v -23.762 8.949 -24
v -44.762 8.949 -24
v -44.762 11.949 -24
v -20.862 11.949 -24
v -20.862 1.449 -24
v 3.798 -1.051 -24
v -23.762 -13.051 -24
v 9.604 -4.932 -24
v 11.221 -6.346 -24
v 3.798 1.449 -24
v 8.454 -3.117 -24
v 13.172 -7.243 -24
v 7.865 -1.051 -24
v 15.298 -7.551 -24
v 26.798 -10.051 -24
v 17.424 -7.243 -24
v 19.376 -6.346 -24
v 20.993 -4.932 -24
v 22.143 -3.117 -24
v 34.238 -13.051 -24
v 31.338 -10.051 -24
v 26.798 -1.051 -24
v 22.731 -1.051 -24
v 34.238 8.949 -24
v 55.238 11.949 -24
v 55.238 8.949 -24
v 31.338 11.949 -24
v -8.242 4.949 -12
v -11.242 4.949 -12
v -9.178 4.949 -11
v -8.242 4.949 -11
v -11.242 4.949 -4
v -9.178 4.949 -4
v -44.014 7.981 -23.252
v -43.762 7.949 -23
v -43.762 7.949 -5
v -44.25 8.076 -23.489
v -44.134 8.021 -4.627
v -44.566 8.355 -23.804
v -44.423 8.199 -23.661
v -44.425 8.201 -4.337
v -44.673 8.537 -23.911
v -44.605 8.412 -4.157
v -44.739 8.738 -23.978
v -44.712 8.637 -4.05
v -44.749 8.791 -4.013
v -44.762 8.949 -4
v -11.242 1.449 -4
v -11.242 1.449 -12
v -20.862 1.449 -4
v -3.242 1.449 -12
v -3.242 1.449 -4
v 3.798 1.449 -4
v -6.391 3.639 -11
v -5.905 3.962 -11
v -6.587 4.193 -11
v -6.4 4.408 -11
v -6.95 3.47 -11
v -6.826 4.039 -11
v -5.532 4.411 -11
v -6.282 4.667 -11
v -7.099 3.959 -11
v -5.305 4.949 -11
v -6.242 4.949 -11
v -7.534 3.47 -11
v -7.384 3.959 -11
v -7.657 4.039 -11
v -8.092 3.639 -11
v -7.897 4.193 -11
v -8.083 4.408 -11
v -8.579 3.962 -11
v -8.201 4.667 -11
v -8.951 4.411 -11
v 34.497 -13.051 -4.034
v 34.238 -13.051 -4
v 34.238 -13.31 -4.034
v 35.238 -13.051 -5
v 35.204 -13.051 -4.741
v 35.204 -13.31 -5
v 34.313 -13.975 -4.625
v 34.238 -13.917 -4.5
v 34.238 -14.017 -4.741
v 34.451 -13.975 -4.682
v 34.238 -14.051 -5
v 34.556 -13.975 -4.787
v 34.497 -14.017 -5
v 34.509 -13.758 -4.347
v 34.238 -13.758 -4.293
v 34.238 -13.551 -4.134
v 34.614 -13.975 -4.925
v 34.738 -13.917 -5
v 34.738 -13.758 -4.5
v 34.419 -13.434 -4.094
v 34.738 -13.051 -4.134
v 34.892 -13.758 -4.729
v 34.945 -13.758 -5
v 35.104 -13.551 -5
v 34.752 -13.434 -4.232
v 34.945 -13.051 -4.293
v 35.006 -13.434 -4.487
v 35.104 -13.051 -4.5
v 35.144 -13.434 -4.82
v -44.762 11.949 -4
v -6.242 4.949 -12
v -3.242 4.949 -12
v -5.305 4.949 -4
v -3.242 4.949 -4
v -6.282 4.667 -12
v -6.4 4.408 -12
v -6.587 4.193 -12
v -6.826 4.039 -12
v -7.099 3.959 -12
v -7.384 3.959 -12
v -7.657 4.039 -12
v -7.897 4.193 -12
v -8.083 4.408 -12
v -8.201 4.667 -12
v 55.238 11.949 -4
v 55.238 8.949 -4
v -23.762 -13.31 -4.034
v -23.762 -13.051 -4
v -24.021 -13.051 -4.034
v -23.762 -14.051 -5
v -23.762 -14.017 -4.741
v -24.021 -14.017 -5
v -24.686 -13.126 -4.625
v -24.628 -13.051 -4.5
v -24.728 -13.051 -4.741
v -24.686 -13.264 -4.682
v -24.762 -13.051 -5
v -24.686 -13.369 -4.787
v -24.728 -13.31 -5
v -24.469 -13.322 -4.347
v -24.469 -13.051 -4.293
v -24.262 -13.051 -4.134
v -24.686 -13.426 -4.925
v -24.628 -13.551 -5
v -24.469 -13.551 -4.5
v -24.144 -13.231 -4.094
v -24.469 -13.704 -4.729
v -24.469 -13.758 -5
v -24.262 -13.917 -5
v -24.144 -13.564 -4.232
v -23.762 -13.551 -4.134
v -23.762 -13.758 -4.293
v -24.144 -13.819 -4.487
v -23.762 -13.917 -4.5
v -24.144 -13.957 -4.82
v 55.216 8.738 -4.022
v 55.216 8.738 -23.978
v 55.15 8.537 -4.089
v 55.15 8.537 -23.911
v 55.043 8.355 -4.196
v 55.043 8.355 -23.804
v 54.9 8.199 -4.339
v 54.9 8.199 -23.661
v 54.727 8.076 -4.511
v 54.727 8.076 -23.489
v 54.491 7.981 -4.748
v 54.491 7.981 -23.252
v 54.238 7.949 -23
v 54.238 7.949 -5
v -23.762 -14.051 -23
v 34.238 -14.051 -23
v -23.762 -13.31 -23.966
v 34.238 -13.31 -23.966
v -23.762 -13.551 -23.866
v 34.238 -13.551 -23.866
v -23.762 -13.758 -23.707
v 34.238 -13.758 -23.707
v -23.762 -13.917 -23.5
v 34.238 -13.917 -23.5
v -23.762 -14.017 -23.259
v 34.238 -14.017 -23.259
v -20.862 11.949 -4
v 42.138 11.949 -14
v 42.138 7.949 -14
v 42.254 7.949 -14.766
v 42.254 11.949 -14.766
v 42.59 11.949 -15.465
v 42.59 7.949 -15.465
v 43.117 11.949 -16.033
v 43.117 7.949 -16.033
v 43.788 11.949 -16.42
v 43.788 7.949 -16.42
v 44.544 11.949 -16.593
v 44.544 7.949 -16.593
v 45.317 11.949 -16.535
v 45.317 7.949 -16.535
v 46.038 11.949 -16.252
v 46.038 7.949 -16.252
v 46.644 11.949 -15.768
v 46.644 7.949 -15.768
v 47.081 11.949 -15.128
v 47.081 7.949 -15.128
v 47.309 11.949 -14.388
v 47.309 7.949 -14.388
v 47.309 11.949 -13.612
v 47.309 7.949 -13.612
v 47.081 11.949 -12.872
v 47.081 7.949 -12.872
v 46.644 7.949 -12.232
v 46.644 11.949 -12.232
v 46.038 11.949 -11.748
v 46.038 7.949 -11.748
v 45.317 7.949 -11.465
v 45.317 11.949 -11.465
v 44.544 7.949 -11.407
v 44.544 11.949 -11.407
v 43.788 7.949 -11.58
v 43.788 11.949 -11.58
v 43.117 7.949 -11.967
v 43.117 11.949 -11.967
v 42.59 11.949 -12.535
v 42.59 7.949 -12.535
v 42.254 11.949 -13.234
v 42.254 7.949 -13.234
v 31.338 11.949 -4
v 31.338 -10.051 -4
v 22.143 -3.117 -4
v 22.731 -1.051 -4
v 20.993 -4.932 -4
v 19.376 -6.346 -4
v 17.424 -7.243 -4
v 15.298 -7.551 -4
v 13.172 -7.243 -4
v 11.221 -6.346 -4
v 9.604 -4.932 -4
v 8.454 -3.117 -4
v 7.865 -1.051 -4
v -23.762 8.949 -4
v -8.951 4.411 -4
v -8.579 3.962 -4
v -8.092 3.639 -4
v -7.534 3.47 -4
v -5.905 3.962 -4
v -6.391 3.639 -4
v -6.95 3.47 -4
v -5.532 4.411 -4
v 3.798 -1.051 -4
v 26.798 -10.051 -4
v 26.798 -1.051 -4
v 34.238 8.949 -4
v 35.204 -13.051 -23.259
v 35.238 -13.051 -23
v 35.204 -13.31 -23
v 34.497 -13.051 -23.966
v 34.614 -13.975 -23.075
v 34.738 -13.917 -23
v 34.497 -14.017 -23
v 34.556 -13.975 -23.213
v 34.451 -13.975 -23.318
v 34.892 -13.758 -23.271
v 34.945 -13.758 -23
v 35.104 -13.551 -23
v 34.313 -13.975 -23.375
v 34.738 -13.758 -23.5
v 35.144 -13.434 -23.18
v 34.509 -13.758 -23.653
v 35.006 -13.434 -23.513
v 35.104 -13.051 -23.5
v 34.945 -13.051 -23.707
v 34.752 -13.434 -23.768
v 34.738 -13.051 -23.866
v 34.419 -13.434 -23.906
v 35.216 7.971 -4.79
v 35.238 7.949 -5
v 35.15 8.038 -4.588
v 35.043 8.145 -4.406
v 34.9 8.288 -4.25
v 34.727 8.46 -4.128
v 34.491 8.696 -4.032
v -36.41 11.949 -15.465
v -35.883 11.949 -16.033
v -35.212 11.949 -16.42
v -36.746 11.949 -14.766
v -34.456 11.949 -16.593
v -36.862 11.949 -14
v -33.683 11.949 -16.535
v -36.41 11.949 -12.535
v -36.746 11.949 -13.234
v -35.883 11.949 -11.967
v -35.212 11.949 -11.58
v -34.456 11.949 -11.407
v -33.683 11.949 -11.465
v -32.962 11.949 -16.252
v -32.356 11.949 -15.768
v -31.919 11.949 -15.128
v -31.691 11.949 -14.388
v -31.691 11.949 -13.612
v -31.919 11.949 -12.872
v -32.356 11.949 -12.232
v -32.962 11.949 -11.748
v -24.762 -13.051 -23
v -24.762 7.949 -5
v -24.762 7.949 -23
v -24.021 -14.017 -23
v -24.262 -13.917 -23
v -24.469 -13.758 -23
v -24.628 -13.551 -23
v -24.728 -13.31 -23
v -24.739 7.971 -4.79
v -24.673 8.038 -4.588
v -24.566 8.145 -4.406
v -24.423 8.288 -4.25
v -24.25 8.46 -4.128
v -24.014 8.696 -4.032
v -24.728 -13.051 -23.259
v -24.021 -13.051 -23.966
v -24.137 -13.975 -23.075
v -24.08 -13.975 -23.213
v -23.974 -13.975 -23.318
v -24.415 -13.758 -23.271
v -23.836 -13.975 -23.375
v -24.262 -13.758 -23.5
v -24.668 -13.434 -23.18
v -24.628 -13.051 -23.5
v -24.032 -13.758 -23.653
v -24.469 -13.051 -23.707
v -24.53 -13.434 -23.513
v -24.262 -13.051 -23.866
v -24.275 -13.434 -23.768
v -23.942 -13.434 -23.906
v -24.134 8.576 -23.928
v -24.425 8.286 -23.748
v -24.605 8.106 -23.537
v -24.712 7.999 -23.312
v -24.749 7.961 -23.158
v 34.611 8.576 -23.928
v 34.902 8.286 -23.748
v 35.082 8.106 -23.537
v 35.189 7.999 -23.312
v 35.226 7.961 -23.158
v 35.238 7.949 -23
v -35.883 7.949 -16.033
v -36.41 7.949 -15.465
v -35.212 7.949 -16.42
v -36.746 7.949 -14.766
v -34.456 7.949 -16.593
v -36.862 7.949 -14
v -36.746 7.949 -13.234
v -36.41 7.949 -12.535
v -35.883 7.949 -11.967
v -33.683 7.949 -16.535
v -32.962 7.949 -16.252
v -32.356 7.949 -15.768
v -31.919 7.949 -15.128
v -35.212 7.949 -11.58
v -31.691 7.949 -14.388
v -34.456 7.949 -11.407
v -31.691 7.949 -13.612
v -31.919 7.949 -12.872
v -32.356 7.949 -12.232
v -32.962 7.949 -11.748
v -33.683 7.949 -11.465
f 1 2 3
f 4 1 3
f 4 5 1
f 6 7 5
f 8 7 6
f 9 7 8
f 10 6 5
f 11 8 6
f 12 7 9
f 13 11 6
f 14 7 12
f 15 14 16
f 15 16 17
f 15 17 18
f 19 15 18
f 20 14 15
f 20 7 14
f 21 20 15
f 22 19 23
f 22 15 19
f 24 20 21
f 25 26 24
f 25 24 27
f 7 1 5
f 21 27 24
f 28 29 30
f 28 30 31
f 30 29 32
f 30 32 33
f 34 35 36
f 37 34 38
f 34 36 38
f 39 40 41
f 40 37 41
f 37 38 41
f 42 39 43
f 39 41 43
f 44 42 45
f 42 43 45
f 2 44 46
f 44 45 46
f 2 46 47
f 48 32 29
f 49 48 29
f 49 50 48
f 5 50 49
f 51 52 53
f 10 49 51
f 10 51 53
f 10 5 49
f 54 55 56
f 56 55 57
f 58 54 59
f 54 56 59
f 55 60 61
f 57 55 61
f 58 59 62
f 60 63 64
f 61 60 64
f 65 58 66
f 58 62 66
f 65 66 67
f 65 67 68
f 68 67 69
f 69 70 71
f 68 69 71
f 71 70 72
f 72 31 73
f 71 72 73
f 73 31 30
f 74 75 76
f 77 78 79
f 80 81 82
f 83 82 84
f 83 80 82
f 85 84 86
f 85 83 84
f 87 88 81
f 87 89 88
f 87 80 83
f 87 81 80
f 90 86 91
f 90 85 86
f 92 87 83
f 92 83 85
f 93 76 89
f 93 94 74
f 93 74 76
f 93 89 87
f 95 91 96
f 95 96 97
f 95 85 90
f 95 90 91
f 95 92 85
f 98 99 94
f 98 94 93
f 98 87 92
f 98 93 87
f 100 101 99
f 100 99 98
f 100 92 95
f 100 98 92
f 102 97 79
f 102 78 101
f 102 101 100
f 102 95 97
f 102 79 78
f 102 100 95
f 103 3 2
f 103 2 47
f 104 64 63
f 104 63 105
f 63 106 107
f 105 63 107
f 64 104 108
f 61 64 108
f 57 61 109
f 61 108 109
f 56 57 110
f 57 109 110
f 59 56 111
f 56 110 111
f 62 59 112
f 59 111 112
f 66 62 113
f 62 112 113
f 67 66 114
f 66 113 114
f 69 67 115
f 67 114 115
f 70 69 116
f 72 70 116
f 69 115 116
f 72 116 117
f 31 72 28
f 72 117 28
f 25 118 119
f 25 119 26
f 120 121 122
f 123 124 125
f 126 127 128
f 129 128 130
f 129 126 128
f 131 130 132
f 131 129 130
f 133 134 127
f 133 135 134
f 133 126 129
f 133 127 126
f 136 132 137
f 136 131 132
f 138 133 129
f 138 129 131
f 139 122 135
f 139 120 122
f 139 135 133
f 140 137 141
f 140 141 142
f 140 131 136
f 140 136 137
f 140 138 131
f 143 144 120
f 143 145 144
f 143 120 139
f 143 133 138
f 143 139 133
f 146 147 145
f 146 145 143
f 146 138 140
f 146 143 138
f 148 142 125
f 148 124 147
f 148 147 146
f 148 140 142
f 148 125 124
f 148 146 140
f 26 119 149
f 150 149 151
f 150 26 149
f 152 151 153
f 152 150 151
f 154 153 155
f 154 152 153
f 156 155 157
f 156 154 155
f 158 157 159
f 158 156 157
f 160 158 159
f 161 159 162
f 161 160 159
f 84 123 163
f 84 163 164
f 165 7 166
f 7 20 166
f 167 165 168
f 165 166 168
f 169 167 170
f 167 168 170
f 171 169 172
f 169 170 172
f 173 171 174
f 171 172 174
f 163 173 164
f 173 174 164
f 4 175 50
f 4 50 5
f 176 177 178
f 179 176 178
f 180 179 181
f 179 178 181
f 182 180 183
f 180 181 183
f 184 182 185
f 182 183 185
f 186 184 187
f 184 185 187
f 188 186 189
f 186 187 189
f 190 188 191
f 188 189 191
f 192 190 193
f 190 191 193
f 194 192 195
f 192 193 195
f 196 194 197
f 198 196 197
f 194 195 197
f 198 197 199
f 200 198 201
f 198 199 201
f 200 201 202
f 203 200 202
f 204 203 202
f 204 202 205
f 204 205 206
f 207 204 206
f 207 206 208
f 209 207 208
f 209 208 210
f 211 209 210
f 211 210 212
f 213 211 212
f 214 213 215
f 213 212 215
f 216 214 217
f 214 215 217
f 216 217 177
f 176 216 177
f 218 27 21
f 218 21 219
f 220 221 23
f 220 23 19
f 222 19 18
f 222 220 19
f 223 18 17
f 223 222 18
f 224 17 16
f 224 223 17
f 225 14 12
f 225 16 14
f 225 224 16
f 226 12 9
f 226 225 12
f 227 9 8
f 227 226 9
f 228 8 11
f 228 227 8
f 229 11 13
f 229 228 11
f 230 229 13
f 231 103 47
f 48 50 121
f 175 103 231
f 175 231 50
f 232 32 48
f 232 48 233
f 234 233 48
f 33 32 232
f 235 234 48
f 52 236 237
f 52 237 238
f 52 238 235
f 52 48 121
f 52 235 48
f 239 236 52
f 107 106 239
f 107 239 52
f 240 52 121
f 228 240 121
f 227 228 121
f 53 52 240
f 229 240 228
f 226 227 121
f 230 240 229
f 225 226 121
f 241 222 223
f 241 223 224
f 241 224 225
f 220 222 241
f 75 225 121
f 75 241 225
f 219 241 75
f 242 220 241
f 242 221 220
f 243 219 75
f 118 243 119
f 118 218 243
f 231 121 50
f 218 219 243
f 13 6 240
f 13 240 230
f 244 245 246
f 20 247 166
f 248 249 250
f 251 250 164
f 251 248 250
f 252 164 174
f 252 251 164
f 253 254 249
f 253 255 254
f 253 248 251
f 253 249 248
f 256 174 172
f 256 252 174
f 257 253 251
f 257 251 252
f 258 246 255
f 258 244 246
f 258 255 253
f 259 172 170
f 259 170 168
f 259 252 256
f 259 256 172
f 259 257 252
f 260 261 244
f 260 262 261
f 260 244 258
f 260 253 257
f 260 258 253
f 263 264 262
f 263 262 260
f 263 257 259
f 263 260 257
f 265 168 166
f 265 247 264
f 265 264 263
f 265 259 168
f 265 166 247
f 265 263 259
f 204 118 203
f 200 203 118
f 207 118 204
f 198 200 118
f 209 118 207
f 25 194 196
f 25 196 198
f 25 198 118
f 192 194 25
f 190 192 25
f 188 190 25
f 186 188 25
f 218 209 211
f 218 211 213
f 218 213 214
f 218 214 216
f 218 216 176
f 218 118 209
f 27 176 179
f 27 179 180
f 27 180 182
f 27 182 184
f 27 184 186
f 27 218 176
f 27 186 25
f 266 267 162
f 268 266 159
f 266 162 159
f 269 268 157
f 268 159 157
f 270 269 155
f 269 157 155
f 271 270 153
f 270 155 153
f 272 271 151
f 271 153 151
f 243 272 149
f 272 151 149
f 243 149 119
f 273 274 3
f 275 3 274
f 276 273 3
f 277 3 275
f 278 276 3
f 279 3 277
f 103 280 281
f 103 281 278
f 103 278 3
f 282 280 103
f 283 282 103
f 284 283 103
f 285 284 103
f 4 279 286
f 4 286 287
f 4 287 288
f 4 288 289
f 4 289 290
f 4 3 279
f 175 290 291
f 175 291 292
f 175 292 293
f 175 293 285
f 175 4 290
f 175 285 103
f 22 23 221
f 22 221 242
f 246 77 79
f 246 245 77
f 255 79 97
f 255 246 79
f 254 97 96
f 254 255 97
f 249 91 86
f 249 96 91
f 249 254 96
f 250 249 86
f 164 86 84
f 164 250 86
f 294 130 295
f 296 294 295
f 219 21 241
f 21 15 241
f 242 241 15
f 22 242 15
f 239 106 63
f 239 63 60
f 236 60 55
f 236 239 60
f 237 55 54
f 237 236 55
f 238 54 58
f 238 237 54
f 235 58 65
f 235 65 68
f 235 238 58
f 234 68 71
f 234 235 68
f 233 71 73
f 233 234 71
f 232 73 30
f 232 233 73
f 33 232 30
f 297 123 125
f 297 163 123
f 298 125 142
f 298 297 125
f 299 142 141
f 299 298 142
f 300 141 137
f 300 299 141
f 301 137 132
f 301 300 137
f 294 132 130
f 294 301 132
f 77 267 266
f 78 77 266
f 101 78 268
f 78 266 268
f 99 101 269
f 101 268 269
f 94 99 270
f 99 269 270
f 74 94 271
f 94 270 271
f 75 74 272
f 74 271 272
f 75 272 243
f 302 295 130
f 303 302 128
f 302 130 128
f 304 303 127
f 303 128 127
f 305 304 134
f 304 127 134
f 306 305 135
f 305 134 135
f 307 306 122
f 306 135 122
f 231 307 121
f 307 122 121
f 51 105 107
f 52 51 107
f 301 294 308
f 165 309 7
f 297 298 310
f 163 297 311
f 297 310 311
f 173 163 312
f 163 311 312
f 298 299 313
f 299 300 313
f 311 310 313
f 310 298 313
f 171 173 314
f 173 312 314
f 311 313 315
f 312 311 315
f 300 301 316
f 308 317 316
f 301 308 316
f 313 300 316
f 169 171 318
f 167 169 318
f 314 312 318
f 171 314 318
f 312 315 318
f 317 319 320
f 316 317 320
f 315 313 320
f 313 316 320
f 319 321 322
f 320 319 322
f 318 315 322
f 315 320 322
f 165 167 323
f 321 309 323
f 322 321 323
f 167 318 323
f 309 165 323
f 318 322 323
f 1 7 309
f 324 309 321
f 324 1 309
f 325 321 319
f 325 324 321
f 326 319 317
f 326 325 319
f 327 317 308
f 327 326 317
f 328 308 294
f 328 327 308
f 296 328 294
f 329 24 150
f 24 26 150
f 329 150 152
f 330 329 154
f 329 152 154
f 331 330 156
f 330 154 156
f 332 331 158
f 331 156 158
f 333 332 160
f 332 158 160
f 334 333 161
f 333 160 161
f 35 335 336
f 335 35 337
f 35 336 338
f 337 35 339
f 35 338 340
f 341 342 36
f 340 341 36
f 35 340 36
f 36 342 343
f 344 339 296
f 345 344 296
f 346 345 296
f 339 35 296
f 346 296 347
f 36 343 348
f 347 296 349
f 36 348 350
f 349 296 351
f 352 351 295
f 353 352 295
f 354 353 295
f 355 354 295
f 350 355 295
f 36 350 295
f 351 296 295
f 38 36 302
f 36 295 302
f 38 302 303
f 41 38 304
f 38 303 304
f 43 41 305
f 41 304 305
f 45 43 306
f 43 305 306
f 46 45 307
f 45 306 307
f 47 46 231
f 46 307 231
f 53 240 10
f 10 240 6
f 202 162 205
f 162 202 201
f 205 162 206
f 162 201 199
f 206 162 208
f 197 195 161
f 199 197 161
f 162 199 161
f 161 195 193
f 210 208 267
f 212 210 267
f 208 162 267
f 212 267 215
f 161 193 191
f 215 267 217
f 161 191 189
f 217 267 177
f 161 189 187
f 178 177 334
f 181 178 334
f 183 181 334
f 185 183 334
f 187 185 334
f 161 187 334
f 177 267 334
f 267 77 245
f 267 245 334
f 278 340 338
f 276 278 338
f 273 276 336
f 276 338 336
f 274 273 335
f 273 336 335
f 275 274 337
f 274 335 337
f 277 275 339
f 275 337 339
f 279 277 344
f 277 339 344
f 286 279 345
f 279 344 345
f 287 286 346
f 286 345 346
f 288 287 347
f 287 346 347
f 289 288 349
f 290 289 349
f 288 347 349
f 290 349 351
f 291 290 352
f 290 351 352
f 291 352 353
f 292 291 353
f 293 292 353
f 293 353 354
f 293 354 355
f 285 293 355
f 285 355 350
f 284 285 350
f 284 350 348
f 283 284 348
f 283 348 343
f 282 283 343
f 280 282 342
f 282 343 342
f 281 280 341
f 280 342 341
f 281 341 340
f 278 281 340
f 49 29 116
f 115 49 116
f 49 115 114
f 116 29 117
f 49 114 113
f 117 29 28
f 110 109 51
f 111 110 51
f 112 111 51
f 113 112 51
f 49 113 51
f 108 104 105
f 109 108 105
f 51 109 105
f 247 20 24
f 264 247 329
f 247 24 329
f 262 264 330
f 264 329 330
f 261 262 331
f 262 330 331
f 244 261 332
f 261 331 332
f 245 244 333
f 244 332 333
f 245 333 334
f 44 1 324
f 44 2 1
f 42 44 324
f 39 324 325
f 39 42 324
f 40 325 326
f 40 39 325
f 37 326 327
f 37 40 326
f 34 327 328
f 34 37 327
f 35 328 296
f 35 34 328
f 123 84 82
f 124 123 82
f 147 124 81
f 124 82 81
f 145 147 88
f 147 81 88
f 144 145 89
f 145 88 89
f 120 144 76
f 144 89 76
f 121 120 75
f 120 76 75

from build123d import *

# Parameters (mm, degrees)
SKETCH_1_W               = 60
SKETCH_1_H               = 26
EXTRUDE_1_DEPTH          = 24
CUT_EXTRUDE_1_DEPTH      = 1
CUT_EXTRUDE_1_DEPTH_BACK = 24
SKETCH_3_W               = 23
SKETCH_3_H               = 24
EXTRUDE_2_DEPTH          = 10
CUT_EXTRUDE_2_DEPTH      = 25
SKETCH_5_W               = 23
SKETCH_5_H               = 1
CUT_EXTRUDE_3_DEPTH      = 25
SKETCH_6_W               = 24.56
SKETCH_6_H               = 24
EXTRUDE_4_DEPTH          = 15.5
CUT_EXTRUDE_5_DEPTH      = 4
CUT_EXTRUDE_6_DEPTH      = 11
SKETCH_10_W              = 8
SKETCH_10_H              = 0.5
CUT_EXTRUDE_8_DEPTH      = 25
SKETCH_11_R              = 1
CUT_EXTRUDE_9_DEPTH      = 11
SKETCH_12_W              = 24
SKETCH_12_H              = 4
EXTRUDE_5_DEPTH          = 20
SKETCH_13_W              = 24
SKETCH_13_H              = 4
EXTRUDE_6_DEPTH          = 20
CUT_EXTRUDE_10_DEPTH     = 4
FILLET_1_R               = 1
SKETCH_15_R              = 2.6
CUT_EXTRUDE_11_DEPTH     = 4
SKETCH_16_R              = 2.6
CUT_EXTRUDE_12_DEPTH     = 4
SKETCH_17_W              = 20
SKETCH_17_H              = 22
CUT_EXTRUDE_13_DEPTH     = 0.1
SKETCH_18_W              = 20
SKETCH_18_H              = 10.5
CUT_EXTRUDE_14_DEPTH     = 0.1


with BuildPart() as part:
    # 草图1 → 凸台-拉伸1 (new body)
    with BuildSketch(Plane.XY):
        with Locations((5.238297872, -1.05106383)):
            Rectangle(SKETCH_1_W, SKETCH_1_H)
    extrude(amount=-EXTRUDE_1_DEPTH)

    # 草图2 → 切除-拉伸1 (cut, two sides)
    with BuildSketch(Plane.XY) as cut_extrude_1_sk:
        Polygon((-20.761702128, 145.431728494), (-20.761702128, 11.94893617), (-20.761702128, -10.05106383), (31.238297872, -10.05106383), (31.238297872, 11.94893617), (31.238297872, 145.431728494), (31.238297872, 412.397313141), (-20.761702128, 412.397313141), align=None)
    extrude(amount=CUT_EXTRUDE_1_DEPTH, mode=Mode.SUBTRACT)
    extrude(cut_extrude_1_sk.sketch, amount=-CUT_EXTRUDE_1_DEPTH_BACK, mode=Mode.SUBTRACT)

    # 草图3 → 凸台-拉伸2 (add)
    with BuildSketch(Plane(origin=(0, -10.05106383, 0), x_dir=(1, 0, 0), z_dir=(0, 1, 0))):
        with Locations((15.298297872, 12)):
            Rectangle(SKETCH_3_W, SKETCH_3_H)
    extrude(amount=EXTRUDE_2_DEPTH)

    # 草图4 → 切除-拉伸2 (cut, through all)
    with BuildSketch(Plane.XY):
        with BuildLine():
            Line((7.798297872, -0.05106383), (22.798297872, -0.05106383))
            ThreePointArc((22.798297872, -0.05106383), (15.298297872, -7.55106383), (7.798297872, -0.05106383))
        make_face()
    extrude(amount=-CUT_EXTRUDE_2_DEPTH, mode=Mode.SUBTRACT)

    # 草图5 → 切除-拉伸3 (cut, through all)
    with BuildSketch(Plane.XY):
        with Locations((15.298297872, -0.55106383)):
            Rectangle(SKETCH_5_W, SKETCH_5_H)
    extrude(amount=-CUT_EXTRUDE_3_DEPTH, mode=Mode.SUBTRACT)

    # 草图6 → 凸台-拉伸4 (add)
    with BuildSketch(Plane(origin=(0, -10.05106383, 0), x_dir=(1, 0, 0), z_dir=(0, 1, 0))):
        with Locations((-8.481702128, 12)):
            Rectangle(SKETCH_6_W, SKETCH_6_H)
    extrude(amount=EXTRUDE_4_DEPTH)

    # 草图7 → 切除-拉伸5 (cut)
    with BuildSketch(Plane(origin=(0, 5.44893617, 0), x_dir=(1, 0, 0), z_dir=(0, 1, 0))):
        Polygon((-20.761702128, 0), (-11.241702128, 0), (-11.241702128, 12), (-3.241702128, 12), (-3.241702128, 0), (3.798297872, 0), (3.798297872, 24), (-20.761702128, 24), align=None)
    extrude(amount=-CUT_EXTRUDE_5_DEPTH, mode=Mode.SUBTRACT)

    # 草图8 → 切除-拉伸6 (cut)
    with BuildSketch(Plane.XY):
        with BuildLine():
            Line((-9.241702128, 5.44893617), (-5.241702128, 5.44893617))
            ThreePointArc((-5.241702128, 5.44893617), (-7.241702128, 3.44893617), (-9.241702128, 5.44893617))
        make_face()
    extrude(amount=-CUT_EXTRUDE_6_DEPTH, mode=Mode.SUBTRACT)

    # 草图10 → 切除-拉伸8 (cut, through all)
    with BuildSketch(Plane.XY):
        with Locations((-7.241702128, 5.19893617)):
            Rectangle(SKETCH_10_W, SKETCH_10_H)
    extrude(amount=-CUT_EXTRUDE_8_DEPTH, mode=Mode.SUBTRACT)

    # 草图11 → 切除-拉伸9 (cut)
    with BuildSketch(Plane(origin=(0, 0, -12), x_dir=(-1, 0, 0), z_dir=(0, 0, -1))):
        with Locations((7.241702128, 4.94893617)):
            Circle(SKETCH_11_R)
    extrude(amount=-CUT_EXTRUDE_9_DEPTH, mode=Mode.SUBTRACT)

    # 草图12 → 凸台-拉伸5 (add)
    with BuildSketch(Plane(origin=(35.238297872, 0, 0), x_dir=(0, 0, -1), z_dir=(1, 0, 0))):
        with Locations((12, 9.94893617)):
            Rectangle(SKETCH_12_W, SKETCH_12_H)
    extrude(amount=EXTRUDE_5_DEPTH)

    # 草图13 → 凸台-拉伸6 (add)
    with BuildSketch(Plane.ZY.offset(24.761702128)):
        with Locations((-12, 9.94893617)):
            Rectangle(SKETCH_13_W, SKETCH_13_H)
    extrude(amount=EXTRUDE_6_DEPTH)

    # 草图14 → 切除-拉伸10 (cut)
    with BuildSketch(Plane.XY):
        with BuildLine():
            Line((-9.178193801, 4.94893617), (-11.241702128, 4.94893617))
            Line((-11.241702128, 4.94893617), (-11.241702128, 1.44893617))
            Line((-11.241702128, 1.44893617), (-20.761702128, 1.44893617))
            Line((-20.761702128, 1.44893617), (-20.761702128, 11.94893617))
            Line((-20.761702128, 11.94893617), (-44.761702128, 11.94893617))
            Line((-44.761702128, 11.94893617), (-44.761702128, 7.94893617))
            Line((-44.761702128, 7.94893617), (-24.761702128, 7.94893617))
            Line((-24.761702128, 7.94893617), (-24.761702128, -14.05106383))
            Line((-24.761702128, -14.05106383), (35.238297872, -14.05106383))
            Line((35.238297872, -14.05106383), (35.238297872, 7.94893617))
            Line((35.238297872, 7.94893617), (55.238297872, 7.94893617))
            Line((55.238297872, 7.94893617), (55.238297872, 11.94893617))
            Line((55.238297872, 11.94893617), (31.238297872, 11.94893617))
            Line((31.238297872, 11.94893617), (31.238297872, -10.05106383))
            Line((31.238297872, -10.05106383), (26.798297872, -10.05106383))
            Line((26.798297872, -10.05106383), (26.798297872, -1.05106383))
            Line((26.798297872, -1.05106383), (22.731332246, -1.05106383))
            ThreePointArc((22.731332246, -1.05106383), (15.298297872, -7.55106383), (7.865263499, -1.05106383))
            Line((7.865263499, -1.05106383), (3.798297872, -1.05106383))
            Line((3.798297872, -1.05106383), (3.798297872, 1.44893617))
            Line((3.798297872, 1.44893617), (-3.241702128, 1.44893617))
            Line((-3.241702128, 1.44893617), (-3.241702128, 4.94893617))
            Line((-3.241702128, 4.94893617), (-5.305210455, 4.94893617))
            ThreePointArc((-5.305210455, 4.94893617), (-7.241702128, 3.44893617), (-9.178193801, 4.94893617))
        make_face()
    extrude(amount=-CUT_EXTRUDE_10_DEPTH, mode=Mode.SUBTRACT)

    # 圆角1
    fillet_1_edges = [part.edges().sort_by_distance(p)[0] for p in [
        (35.238297872, -3.05106383, -24),
        (45.238297872, 7.94893617, -24),
        (-24.761702128, -3.05106383, -24),
        (-34.761702128, 7.94893617, -24),
        (-44.761702128, 7.94893617, -14),
        (55.238297872, 7.94893617, -14),
        (45.238297872, 7.94893617, -4),
        (35.238297872, -3.05106383, -4),
        (5.238297872, -14.05106383, -4),
        (-24.761702128, -3.05106383, -4),
        (-34.761702128, 7.94893617, -4),
        (35.238297872, -14.05106383, -14),
        (-24.761702128, -14.05106383, -14),
        (5.238297872, -14.05106383, -24),
    ]]
    fillet(fillet_1_edges, radius=FILLET_1_R)

    # 草图15 → 切除-拉伸11 (cut)
    with BuildSketch(Plane(origin=(0, 7.94893617, 0), x_dir=(-1, 0, 0), z_dir=(0, -1, 0))):
        with Locations((34.261702128, 14)):
            Circle(SKETCH_15_R)
    extrude(amount=-CUT_EXTRUDE_11_DEPTH, mode=Mode.SUBTRACT)

    # 草图16 → 切除-拉伸12 (cut)
    with BuildSketch(Plane(origin=(0, 7.94893617, 0), x_dir=(-1, 0, 0), z_dir=(0, -1, 0))):
        with Locations((-44.738297872, 14)):
            Circle(SKETCH_16_R)
    extrude(amount=-CUT_EXTRUDE_12_DEPTH, mode=Mode.SUBTRACT)

    # 草图17 → 切除-拉伸13 (cut)
    with BuildSketch(Plane.ZY.offset(-31.238297872)):
        with Locations((-14, 0.94893617)):
            Rectangle(SKETCH_17_W, SKETCH_17_H)
    extrude(amount=-CUT_EXTRUDE_13_DEPTH, mode=Mode.SUBTRACT)

    # 草图18 → 切除-拉伸14 (cut)
    with BuildSketch(Plane(origin=(-20.761702128, 0, 0), x_dir=(0, 0, -1), z_dir=(1, 0, 0))):
        with Locations((14, 6.69893617)):
            Rectangle(SKETCH_18_W, SKETCH_18_H)
    extrude(amount=-CUT_EXTRUDE_14_DEPTH, mode=Mode.SUBTRACT)


solid = part.part
